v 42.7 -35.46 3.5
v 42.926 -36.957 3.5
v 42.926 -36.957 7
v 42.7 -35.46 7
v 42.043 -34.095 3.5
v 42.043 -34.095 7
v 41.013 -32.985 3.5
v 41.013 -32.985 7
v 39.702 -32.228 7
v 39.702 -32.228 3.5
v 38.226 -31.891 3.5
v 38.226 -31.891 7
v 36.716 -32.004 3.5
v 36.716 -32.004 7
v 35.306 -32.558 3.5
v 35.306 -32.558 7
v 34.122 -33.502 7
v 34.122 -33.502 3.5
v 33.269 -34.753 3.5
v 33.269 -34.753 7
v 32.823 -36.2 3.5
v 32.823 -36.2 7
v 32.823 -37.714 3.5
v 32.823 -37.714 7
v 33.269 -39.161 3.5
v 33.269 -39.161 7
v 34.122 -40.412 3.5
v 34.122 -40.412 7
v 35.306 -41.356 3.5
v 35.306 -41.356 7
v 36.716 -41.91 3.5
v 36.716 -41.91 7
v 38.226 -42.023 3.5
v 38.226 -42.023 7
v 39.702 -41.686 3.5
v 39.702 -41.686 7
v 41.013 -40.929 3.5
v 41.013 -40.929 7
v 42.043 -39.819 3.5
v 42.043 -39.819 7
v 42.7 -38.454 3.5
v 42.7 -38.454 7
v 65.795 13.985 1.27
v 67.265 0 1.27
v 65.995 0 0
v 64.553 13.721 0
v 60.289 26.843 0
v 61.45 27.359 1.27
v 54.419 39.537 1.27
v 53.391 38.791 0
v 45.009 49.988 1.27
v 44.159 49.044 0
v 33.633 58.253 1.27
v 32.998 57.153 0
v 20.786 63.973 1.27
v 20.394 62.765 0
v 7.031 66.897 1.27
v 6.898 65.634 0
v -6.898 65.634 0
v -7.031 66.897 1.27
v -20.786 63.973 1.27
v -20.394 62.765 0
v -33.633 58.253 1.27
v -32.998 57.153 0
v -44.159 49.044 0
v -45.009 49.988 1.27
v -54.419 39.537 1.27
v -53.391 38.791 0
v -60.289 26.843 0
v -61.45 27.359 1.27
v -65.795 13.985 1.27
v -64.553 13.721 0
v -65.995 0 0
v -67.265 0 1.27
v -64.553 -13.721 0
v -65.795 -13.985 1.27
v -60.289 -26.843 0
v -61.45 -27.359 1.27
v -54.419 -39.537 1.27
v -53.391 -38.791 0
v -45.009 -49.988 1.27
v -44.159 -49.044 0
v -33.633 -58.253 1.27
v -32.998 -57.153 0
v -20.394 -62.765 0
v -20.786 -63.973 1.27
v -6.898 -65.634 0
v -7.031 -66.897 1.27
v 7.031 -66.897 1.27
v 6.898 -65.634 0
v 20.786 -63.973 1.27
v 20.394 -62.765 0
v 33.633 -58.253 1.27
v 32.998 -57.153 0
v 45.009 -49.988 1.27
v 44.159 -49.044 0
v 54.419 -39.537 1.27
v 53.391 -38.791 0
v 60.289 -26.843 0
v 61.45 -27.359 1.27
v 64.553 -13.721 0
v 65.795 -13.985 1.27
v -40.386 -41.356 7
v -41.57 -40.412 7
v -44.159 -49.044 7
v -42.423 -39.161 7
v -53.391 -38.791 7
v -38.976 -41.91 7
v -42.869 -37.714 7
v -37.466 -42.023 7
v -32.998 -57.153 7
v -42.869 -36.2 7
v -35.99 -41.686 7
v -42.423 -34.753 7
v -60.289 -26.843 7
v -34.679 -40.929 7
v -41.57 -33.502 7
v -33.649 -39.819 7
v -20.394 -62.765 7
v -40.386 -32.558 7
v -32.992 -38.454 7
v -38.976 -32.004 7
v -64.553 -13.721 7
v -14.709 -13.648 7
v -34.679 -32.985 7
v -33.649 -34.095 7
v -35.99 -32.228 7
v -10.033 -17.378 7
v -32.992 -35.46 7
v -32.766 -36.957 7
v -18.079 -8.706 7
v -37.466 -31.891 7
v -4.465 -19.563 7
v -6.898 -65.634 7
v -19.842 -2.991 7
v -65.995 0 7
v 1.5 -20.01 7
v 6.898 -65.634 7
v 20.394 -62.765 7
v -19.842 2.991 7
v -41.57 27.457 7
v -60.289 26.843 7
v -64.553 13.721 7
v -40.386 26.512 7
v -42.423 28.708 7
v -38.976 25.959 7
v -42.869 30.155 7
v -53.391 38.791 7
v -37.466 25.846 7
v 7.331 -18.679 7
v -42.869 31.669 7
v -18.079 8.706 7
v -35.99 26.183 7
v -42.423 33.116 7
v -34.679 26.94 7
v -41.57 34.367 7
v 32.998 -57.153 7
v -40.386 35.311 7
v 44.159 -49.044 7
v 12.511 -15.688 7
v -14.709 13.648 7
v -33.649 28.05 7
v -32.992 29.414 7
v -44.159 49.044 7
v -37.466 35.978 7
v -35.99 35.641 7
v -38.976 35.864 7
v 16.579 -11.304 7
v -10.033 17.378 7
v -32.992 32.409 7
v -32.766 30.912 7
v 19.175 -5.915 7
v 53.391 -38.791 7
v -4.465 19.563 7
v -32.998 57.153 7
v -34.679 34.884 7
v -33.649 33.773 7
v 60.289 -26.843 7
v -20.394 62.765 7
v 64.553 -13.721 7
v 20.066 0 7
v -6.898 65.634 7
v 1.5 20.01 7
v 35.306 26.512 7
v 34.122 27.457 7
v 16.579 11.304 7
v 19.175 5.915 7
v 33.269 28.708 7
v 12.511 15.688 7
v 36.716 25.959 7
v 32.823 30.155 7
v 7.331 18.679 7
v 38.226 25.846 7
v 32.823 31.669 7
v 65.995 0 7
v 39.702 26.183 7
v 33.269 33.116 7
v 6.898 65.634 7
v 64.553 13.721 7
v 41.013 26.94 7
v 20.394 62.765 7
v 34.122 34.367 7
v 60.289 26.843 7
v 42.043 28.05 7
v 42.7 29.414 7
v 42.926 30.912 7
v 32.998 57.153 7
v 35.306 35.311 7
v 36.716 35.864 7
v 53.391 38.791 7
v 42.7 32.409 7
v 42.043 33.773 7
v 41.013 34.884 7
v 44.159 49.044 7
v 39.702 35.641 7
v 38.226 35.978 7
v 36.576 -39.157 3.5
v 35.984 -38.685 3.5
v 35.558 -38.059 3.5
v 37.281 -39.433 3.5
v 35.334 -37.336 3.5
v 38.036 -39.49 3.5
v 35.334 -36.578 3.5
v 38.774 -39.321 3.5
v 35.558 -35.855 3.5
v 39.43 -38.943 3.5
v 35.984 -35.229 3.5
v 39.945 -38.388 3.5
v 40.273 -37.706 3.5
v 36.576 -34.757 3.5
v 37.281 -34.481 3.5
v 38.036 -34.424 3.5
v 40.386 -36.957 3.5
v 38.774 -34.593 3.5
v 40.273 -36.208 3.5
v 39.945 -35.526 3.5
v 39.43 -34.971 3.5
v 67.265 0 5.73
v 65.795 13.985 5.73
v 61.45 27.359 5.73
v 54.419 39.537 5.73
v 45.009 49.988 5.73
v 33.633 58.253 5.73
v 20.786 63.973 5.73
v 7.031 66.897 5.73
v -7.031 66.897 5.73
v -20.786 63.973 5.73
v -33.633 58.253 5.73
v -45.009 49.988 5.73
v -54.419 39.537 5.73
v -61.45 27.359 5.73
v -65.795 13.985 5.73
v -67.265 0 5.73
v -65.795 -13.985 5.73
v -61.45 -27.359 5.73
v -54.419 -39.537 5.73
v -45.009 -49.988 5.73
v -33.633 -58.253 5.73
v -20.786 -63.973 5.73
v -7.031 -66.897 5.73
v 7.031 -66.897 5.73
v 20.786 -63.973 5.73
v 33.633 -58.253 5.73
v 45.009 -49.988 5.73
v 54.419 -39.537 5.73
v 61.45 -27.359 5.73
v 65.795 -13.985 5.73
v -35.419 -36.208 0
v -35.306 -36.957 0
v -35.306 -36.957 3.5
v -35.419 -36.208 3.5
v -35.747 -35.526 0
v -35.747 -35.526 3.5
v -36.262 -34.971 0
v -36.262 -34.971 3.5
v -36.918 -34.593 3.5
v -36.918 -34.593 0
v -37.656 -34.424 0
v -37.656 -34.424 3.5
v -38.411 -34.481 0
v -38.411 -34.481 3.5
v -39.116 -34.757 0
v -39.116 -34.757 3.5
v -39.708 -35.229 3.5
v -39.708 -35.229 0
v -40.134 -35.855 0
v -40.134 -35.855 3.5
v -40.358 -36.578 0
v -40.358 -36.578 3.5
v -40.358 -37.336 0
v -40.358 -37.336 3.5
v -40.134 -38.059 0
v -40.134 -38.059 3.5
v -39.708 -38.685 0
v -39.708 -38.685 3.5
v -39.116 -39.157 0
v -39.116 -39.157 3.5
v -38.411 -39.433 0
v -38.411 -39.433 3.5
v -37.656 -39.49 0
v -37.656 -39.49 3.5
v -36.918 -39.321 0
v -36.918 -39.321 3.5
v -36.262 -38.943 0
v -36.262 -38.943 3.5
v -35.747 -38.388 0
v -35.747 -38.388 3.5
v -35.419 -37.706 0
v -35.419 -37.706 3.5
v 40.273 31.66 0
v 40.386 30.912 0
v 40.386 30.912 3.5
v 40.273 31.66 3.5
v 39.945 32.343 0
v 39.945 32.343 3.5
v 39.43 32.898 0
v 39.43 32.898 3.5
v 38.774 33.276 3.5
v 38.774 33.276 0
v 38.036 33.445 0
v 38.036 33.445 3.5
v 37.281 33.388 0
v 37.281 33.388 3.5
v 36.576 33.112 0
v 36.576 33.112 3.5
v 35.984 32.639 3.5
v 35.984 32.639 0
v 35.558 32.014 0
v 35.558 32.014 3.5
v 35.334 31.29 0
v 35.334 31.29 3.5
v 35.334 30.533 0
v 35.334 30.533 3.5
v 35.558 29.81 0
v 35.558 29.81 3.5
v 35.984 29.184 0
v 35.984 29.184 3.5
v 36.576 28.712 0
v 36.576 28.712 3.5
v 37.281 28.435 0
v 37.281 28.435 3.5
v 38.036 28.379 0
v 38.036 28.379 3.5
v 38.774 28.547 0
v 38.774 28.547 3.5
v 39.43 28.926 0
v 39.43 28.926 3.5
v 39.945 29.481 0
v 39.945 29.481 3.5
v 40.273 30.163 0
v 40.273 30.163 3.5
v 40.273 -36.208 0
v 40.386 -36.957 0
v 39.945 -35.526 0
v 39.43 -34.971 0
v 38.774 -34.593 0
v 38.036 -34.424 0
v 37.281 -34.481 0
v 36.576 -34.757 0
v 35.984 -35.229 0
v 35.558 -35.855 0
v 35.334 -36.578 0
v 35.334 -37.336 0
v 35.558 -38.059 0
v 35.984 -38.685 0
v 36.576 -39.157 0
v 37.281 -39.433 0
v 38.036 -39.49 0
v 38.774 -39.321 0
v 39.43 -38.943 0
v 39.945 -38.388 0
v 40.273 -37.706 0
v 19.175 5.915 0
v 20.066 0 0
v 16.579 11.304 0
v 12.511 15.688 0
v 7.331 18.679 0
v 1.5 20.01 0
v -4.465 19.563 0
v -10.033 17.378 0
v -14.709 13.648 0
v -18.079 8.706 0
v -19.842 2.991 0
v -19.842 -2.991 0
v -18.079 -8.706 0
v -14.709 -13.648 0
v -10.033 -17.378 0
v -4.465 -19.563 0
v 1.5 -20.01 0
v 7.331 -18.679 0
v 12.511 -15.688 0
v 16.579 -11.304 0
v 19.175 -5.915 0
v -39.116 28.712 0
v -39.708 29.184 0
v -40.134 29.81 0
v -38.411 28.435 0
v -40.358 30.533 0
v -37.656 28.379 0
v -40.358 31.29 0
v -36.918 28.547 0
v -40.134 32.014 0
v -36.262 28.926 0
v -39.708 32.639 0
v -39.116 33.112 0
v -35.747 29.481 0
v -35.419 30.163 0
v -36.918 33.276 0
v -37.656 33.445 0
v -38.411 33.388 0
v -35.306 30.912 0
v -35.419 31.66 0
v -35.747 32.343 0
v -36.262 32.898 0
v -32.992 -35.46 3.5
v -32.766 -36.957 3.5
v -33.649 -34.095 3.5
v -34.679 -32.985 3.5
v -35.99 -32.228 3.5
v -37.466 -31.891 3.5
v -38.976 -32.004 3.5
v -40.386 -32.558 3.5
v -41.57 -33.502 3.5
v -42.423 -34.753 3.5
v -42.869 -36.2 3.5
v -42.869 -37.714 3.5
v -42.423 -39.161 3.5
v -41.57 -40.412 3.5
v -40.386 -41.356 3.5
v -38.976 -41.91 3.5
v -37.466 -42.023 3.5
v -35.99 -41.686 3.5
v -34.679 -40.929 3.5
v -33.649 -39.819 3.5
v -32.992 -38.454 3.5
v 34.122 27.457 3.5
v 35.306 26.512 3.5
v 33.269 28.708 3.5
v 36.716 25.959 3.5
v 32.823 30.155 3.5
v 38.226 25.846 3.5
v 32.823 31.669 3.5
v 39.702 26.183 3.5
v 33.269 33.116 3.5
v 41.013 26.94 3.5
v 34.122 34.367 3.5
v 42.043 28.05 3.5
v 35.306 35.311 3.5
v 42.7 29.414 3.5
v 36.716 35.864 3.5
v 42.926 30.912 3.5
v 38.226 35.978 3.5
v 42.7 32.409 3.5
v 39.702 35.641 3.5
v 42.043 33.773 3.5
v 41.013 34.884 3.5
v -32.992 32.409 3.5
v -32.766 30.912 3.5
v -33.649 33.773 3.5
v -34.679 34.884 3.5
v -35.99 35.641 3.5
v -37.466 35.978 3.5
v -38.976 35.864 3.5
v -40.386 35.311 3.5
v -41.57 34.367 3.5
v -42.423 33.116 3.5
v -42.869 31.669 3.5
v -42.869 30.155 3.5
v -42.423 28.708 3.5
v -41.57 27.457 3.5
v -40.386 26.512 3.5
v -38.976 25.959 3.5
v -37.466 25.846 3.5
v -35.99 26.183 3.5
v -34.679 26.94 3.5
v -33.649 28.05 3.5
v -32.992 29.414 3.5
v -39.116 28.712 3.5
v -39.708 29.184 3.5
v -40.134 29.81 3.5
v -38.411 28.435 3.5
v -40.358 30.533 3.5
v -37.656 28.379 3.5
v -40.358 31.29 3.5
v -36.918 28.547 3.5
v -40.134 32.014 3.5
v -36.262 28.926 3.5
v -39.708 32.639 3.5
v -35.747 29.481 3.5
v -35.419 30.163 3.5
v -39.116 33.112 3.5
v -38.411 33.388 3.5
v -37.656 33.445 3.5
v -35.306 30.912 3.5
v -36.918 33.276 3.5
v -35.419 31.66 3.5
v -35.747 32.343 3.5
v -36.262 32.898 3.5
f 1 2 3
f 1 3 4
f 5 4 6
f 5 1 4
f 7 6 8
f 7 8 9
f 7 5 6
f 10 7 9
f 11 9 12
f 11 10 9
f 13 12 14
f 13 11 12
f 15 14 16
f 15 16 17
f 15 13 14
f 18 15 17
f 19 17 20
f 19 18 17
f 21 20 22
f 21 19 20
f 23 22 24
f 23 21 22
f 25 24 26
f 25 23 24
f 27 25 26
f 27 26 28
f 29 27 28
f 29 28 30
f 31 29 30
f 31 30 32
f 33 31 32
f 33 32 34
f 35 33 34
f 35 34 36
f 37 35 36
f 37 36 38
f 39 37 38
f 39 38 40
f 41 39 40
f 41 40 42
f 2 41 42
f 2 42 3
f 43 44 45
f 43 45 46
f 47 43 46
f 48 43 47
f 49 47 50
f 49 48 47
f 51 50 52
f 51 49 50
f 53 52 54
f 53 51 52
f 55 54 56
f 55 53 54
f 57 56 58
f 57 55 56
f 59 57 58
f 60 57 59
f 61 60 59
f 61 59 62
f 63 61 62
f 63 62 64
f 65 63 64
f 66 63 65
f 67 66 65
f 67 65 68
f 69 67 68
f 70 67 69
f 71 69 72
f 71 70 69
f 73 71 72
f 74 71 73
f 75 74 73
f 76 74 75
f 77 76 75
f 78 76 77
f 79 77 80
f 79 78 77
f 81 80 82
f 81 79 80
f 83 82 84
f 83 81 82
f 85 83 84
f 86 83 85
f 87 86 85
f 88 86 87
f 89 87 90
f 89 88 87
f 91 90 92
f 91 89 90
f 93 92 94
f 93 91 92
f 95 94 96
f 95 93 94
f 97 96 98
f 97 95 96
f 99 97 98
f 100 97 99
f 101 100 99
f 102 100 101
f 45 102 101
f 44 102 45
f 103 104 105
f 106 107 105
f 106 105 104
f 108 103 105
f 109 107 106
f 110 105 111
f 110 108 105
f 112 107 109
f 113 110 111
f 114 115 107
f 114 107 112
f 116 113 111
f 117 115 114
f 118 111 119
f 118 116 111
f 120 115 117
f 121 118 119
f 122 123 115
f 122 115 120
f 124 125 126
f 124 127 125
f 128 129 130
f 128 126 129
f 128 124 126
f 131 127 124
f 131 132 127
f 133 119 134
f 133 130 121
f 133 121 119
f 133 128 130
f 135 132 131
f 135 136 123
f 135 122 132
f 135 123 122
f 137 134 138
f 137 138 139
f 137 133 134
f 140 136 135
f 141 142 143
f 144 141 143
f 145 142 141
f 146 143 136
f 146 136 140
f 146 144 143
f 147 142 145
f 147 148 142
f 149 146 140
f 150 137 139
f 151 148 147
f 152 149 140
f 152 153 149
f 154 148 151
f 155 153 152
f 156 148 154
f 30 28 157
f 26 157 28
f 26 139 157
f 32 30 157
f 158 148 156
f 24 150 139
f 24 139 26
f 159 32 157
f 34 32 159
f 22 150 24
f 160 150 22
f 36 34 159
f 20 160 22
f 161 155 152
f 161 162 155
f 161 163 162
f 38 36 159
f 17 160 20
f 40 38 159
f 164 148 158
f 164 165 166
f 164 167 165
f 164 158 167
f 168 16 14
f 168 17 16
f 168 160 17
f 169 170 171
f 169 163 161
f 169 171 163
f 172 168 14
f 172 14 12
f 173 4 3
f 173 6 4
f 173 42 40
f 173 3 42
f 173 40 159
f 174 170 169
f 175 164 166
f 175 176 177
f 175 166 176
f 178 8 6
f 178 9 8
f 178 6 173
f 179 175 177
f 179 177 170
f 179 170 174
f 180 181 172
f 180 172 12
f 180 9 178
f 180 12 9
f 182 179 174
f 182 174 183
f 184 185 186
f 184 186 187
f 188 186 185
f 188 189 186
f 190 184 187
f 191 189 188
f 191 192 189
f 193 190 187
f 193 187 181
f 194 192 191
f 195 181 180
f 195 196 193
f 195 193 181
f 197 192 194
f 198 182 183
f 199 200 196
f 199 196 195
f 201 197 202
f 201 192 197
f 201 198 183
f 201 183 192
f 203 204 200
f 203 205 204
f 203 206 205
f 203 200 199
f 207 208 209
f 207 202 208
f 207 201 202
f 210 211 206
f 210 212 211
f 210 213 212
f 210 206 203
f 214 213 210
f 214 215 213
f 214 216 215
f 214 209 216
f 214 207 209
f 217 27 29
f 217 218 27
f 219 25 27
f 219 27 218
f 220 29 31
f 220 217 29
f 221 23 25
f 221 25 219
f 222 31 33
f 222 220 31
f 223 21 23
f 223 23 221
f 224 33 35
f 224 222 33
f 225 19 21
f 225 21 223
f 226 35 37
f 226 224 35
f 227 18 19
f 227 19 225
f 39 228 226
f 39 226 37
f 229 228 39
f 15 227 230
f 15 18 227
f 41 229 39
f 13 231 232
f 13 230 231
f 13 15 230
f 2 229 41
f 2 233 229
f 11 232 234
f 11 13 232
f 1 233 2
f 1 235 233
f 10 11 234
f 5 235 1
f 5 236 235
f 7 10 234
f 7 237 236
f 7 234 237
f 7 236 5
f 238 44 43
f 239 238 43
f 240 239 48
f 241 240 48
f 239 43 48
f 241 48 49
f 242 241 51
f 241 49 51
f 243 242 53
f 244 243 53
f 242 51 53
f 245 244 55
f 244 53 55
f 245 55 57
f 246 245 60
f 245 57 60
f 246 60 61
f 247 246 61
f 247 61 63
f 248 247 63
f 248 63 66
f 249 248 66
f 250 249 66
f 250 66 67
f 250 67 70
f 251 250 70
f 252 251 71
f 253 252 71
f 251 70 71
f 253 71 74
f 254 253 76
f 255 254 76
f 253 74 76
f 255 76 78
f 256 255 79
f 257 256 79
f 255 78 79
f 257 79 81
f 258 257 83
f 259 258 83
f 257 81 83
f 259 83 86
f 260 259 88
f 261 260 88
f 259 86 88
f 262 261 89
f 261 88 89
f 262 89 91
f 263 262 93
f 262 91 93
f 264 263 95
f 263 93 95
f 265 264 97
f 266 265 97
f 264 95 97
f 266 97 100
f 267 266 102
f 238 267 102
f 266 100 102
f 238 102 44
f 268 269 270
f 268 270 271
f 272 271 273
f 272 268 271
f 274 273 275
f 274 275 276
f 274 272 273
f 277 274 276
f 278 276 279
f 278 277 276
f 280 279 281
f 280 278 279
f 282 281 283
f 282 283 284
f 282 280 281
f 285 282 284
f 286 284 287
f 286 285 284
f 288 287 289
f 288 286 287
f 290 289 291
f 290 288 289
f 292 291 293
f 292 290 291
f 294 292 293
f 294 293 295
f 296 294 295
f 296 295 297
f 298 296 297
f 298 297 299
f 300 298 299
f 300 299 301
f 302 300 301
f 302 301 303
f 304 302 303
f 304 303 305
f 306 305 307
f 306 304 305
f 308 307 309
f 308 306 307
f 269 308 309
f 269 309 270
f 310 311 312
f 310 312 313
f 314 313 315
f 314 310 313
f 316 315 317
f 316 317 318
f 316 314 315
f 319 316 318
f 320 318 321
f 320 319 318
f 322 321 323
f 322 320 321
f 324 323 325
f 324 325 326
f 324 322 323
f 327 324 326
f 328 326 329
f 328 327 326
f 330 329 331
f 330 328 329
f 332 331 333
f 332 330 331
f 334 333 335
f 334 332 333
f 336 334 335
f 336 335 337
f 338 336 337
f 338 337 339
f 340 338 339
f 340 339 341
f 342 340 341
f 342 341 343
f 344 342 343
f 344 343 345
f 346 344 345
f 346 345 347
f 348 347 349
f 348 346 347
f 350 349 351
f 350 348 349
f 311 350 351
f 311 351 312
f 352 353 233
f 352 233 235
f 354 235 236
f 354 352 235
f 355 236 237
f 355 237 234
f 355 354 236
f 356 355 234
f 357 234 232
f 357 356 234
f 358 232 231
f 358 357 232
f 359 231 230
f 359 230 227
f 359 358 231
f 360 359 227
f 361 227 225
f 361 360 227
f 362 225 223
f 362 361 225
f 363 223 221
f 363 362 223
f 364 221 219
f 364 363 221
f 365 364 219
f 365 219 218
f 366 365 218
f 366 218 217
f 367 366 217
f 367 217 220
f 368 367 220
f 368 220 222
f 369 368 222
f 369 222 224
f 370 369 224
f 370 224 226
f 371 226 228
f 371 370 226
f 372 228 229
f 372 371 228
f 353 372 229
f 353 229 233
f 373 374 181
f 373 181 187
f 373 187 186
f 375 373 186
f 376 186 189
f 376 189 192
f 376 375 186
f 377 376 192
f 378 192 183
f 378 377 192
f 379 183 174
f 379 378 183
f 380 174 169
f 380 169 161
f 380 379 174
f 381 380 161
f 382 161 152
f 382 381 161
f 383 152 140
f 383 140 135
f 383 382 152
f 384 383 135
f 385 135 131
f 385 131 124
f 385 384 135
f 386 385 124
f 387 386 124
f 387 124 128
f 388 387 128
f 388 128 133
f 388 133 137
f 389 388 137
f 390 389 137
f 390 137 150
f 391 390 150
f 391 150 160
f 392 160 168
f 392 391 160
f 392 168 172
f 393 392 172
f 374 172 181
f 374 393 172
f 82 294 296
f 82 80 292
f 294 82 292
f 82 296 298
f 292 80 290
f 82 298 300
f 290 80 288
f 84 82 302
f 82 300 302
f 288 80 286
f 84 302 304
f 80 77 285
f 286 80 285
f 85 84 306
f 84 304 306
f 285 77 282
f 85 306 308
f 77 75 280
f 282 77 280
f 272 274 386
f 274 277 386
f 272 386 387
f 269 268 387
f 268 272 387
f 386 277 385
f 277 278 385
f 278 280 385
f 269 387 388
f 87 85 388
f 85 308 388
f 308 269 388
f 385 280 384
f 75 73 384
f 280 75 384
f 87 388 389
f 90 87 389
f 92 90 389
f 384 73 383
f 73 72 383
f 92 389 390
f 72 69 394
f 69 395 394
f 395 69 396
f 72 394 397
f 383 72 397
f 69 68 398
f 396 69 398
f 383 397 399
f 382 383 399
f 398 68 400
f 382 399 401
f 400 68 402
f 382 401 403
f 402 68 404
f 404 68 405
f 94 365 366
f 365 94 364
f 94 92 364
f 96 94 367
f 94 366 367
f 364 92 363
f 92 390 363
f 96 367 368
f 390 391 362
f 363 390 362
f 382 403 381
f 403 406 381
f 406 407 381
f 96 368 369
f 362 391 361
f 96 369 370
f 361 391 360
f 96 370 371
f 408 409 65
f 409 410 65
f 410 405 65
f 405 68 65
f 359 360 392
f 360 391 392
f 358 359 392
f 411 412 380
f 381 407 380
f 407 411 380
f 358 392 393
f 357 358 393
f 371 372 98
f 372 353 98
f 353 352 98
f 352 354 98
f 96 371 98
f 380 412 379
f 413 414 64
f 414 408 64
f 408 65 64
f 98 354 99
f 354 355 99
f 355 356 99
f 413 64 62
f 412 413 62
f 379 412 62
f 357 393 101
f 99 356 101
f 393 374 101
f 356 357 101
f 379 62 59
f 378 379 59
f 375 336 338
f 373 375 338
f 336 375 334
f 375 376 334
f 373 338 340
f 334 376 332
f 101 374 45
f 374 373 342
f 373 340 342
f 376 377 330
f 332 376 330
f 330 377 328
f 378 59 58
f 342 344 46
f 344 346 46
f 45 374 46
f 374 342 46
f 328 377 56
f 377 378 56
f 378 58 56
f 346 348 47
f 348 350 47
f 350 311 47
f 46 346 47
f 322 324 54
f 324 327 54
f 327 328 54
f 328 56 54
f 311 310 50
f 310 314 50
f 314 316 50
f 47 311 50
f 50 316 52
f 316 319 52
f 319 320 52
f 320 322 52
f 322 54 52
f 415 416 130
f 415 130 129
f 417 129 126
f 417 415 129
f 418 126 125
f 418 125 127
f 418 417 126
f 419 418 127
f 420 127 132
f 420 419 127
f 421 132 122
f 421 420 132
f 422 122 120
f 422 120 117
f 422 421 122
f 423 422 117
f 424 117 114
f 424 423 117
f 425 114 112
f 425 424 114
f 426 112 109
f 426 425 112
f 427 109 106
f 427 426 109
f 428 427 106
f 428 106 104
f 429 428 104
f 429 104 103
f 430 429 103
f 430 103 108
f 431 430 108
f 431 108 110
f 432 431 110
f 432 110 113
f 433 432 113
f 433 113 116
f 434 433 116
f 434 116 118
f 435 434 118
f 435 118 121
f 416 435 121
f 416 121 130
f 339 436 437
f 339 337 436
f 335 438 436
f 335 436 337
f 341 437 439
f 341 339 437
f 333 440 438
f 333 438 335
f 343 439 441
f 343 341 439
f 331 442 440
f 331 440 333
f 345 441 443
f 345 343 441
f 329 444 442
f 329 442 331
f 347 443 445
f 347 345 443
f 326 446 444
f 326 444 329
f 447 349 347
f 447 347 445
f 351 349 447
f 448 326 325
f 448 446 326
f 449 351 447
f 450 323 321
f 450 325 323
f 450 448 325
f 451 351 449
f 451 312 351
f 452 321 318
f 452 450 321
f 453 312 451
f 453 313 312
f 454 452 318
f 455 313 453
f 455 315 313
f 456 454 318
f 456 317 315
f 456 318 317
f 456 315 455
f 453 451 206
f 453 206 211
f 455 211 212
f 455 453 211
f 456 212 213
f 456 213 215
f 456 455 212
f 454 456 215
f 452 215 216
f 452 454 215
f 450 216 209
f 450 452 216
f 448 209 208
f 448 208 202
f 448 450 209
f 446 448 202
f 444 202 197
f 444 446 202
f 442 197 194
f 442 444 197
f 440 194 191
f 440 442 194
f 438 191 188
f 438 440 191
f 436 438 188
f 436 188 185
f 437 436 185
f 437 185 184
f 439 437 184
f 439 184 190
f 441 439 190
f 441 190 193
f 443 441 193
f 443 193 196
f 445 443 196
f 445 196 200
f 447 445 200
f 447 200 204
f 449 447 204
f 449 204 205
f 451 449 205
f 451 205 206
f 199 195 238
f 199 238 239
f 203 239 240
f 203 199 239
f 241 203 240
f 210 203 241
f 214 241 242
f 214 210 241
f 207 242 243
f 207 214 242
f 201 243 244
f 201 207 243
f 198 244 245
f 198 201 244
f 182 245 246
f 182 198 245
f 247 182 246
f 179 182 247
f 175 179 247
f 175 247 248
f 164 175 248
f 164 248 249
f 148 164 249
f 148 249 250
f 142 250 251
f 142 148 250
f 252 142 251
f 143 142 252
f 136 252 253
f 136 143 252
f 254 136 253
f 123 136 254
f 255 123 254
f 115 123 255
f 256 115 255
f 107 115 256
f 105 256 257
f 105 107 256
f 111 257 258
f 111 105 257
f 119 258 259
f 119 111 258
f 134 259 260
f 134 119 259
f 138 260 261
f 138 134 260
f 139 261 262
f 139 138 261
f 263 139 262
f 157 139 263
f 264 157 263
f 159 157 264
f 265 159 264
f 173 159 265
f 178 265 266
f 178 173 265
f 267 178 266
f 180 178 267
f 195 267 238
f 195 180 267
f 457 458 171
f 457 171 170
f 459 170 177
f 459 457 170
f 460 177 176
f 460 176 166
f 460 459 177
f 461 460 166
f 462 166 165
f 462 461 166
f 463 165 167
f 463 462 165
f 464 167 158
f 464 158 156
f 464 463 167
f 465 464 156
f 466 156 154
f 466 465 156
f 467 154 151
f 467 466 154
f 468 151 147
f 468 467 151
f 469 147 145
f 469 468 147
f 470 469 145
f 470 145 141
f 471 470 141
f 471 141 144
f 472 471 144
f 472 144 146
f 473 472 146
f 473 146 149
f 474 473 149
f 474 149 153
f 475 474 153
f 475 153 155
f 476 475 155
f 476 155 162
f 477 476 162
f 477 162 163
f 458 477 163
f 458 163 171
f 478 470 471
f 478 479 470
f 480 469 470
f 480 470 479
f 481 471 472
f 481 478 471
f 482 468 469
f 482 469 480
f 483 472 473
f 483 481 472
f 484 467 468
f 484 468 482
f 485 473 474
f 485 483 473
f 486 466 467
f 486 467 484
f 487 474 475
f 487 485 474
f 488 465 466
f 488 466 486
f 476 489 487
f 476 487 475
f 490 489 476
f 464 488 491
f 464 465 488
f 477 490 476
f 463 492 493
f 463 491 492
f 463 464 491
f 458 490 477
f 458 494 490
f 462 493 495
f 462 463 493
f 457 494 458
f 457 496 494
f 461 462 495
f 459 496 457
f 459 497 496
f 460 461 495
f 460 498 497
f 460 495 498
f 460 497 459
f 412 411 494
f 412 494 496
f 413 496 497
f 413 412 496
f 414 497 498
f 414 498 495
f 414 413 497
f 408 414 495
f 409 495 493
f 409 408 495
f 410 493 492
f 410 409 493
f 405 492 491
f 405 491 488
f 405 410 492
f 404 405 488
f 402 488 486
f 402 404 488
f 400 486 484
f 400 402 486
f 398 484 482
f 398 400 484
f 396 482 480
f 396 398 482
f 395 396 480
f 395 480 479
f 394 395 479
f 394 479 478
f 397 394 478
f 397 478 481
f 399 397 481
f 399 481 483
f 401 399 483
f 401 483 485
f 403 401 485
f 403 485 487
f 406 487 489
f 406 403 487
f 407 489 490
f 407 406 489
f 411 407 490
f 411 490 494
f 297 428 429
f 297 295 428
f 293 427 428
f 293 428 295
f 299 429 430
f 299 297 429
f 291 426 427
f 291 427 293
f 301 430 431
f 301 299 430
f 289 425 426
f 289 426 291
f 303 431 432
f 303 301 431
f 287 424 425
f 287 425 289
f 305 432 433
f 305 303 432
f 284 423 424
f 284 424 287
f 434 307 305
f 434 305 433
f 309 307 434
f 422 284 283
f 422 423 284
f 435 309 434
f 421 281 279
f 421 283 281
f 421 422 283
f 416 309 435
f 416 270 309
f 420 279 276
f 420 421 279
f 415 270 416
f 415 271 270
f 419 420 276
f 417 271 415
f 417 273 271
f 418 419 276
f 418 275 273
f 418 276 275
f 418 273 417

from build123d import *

# Parameters (mm, degrees)
F2_R     = 67.2650557496
F2_R_2   = 5.08
F2_R_3   = 20.066
F3_DEPTH = 7
F1_R     = 5.08
F1_R_2   = 2.54
F4_DEPTH = 3.5
F5_SIZE  = 1.27


with BuildPart() as f3:
    # F2 (on Top) → F3 (new body)
    with BuildSketch(Plane.XY):
        Circle(F2_R)
        with Locations((-37.846, -36.957)):
            Circle(F2_R_2, mode=Mode.SUBTRACT)
        with Locations((37.846, -36.957)):
            Circle(F2_R_2, mode=Mode.SUBTRACT)
        with Locations((-37.846, 30.9118)):
            Circle(F2_R_2, mode=Mode.SUBTRACT)
        Circle(F2_R_3, mode=Mode.SUBTRACT)
        with Locations((37.846, 30.9118)):
            Circle(F2_R_2, mode=Mode.SUBTRACT)
    extrude(amount=F3_DEPTH)

    # F1 (on Top) → F4 (join)
    with BuildSketch(Plane.XY):
        with Locations((-37.846, 30.9118)):
            Circle(F1_R)
        with Locations((-37.846, 30.9118)):
            Circle(F1_R_2, mode=Mode.SUBTRACT)
        with Locations((37.846, 30.9118)):
            Circle(F1_R)
        with Locations((37.846, 30.9118)):
            Circle(F1_R_2, mode=Mode.SUBTRACT)
        with Locations((37.846, -36.957)):
            Circle(F1_R)
        with Locations((37.846, -36.957)):
            Circle(F1_R_2, mode=Mode.SUBTRACT)
        with Locations((-37.846, -36.957)):
            Circle(F1_R)
        with Locations((-37.846, -36.957)):
            Circle(F1_R_2, mode=Mode.SUBTRACT)
    extrude(amount=F4_DEPTH)

    # F5
    f5_edges = [f3.edges().sort_by_distance(p)[0] for p in [
        (-67.265056, 0, 0),
        (-67.265056, 0, 7),
    ]]
    chamfer(f5_edges, length=F5_SIZE)


solid = f3.part
